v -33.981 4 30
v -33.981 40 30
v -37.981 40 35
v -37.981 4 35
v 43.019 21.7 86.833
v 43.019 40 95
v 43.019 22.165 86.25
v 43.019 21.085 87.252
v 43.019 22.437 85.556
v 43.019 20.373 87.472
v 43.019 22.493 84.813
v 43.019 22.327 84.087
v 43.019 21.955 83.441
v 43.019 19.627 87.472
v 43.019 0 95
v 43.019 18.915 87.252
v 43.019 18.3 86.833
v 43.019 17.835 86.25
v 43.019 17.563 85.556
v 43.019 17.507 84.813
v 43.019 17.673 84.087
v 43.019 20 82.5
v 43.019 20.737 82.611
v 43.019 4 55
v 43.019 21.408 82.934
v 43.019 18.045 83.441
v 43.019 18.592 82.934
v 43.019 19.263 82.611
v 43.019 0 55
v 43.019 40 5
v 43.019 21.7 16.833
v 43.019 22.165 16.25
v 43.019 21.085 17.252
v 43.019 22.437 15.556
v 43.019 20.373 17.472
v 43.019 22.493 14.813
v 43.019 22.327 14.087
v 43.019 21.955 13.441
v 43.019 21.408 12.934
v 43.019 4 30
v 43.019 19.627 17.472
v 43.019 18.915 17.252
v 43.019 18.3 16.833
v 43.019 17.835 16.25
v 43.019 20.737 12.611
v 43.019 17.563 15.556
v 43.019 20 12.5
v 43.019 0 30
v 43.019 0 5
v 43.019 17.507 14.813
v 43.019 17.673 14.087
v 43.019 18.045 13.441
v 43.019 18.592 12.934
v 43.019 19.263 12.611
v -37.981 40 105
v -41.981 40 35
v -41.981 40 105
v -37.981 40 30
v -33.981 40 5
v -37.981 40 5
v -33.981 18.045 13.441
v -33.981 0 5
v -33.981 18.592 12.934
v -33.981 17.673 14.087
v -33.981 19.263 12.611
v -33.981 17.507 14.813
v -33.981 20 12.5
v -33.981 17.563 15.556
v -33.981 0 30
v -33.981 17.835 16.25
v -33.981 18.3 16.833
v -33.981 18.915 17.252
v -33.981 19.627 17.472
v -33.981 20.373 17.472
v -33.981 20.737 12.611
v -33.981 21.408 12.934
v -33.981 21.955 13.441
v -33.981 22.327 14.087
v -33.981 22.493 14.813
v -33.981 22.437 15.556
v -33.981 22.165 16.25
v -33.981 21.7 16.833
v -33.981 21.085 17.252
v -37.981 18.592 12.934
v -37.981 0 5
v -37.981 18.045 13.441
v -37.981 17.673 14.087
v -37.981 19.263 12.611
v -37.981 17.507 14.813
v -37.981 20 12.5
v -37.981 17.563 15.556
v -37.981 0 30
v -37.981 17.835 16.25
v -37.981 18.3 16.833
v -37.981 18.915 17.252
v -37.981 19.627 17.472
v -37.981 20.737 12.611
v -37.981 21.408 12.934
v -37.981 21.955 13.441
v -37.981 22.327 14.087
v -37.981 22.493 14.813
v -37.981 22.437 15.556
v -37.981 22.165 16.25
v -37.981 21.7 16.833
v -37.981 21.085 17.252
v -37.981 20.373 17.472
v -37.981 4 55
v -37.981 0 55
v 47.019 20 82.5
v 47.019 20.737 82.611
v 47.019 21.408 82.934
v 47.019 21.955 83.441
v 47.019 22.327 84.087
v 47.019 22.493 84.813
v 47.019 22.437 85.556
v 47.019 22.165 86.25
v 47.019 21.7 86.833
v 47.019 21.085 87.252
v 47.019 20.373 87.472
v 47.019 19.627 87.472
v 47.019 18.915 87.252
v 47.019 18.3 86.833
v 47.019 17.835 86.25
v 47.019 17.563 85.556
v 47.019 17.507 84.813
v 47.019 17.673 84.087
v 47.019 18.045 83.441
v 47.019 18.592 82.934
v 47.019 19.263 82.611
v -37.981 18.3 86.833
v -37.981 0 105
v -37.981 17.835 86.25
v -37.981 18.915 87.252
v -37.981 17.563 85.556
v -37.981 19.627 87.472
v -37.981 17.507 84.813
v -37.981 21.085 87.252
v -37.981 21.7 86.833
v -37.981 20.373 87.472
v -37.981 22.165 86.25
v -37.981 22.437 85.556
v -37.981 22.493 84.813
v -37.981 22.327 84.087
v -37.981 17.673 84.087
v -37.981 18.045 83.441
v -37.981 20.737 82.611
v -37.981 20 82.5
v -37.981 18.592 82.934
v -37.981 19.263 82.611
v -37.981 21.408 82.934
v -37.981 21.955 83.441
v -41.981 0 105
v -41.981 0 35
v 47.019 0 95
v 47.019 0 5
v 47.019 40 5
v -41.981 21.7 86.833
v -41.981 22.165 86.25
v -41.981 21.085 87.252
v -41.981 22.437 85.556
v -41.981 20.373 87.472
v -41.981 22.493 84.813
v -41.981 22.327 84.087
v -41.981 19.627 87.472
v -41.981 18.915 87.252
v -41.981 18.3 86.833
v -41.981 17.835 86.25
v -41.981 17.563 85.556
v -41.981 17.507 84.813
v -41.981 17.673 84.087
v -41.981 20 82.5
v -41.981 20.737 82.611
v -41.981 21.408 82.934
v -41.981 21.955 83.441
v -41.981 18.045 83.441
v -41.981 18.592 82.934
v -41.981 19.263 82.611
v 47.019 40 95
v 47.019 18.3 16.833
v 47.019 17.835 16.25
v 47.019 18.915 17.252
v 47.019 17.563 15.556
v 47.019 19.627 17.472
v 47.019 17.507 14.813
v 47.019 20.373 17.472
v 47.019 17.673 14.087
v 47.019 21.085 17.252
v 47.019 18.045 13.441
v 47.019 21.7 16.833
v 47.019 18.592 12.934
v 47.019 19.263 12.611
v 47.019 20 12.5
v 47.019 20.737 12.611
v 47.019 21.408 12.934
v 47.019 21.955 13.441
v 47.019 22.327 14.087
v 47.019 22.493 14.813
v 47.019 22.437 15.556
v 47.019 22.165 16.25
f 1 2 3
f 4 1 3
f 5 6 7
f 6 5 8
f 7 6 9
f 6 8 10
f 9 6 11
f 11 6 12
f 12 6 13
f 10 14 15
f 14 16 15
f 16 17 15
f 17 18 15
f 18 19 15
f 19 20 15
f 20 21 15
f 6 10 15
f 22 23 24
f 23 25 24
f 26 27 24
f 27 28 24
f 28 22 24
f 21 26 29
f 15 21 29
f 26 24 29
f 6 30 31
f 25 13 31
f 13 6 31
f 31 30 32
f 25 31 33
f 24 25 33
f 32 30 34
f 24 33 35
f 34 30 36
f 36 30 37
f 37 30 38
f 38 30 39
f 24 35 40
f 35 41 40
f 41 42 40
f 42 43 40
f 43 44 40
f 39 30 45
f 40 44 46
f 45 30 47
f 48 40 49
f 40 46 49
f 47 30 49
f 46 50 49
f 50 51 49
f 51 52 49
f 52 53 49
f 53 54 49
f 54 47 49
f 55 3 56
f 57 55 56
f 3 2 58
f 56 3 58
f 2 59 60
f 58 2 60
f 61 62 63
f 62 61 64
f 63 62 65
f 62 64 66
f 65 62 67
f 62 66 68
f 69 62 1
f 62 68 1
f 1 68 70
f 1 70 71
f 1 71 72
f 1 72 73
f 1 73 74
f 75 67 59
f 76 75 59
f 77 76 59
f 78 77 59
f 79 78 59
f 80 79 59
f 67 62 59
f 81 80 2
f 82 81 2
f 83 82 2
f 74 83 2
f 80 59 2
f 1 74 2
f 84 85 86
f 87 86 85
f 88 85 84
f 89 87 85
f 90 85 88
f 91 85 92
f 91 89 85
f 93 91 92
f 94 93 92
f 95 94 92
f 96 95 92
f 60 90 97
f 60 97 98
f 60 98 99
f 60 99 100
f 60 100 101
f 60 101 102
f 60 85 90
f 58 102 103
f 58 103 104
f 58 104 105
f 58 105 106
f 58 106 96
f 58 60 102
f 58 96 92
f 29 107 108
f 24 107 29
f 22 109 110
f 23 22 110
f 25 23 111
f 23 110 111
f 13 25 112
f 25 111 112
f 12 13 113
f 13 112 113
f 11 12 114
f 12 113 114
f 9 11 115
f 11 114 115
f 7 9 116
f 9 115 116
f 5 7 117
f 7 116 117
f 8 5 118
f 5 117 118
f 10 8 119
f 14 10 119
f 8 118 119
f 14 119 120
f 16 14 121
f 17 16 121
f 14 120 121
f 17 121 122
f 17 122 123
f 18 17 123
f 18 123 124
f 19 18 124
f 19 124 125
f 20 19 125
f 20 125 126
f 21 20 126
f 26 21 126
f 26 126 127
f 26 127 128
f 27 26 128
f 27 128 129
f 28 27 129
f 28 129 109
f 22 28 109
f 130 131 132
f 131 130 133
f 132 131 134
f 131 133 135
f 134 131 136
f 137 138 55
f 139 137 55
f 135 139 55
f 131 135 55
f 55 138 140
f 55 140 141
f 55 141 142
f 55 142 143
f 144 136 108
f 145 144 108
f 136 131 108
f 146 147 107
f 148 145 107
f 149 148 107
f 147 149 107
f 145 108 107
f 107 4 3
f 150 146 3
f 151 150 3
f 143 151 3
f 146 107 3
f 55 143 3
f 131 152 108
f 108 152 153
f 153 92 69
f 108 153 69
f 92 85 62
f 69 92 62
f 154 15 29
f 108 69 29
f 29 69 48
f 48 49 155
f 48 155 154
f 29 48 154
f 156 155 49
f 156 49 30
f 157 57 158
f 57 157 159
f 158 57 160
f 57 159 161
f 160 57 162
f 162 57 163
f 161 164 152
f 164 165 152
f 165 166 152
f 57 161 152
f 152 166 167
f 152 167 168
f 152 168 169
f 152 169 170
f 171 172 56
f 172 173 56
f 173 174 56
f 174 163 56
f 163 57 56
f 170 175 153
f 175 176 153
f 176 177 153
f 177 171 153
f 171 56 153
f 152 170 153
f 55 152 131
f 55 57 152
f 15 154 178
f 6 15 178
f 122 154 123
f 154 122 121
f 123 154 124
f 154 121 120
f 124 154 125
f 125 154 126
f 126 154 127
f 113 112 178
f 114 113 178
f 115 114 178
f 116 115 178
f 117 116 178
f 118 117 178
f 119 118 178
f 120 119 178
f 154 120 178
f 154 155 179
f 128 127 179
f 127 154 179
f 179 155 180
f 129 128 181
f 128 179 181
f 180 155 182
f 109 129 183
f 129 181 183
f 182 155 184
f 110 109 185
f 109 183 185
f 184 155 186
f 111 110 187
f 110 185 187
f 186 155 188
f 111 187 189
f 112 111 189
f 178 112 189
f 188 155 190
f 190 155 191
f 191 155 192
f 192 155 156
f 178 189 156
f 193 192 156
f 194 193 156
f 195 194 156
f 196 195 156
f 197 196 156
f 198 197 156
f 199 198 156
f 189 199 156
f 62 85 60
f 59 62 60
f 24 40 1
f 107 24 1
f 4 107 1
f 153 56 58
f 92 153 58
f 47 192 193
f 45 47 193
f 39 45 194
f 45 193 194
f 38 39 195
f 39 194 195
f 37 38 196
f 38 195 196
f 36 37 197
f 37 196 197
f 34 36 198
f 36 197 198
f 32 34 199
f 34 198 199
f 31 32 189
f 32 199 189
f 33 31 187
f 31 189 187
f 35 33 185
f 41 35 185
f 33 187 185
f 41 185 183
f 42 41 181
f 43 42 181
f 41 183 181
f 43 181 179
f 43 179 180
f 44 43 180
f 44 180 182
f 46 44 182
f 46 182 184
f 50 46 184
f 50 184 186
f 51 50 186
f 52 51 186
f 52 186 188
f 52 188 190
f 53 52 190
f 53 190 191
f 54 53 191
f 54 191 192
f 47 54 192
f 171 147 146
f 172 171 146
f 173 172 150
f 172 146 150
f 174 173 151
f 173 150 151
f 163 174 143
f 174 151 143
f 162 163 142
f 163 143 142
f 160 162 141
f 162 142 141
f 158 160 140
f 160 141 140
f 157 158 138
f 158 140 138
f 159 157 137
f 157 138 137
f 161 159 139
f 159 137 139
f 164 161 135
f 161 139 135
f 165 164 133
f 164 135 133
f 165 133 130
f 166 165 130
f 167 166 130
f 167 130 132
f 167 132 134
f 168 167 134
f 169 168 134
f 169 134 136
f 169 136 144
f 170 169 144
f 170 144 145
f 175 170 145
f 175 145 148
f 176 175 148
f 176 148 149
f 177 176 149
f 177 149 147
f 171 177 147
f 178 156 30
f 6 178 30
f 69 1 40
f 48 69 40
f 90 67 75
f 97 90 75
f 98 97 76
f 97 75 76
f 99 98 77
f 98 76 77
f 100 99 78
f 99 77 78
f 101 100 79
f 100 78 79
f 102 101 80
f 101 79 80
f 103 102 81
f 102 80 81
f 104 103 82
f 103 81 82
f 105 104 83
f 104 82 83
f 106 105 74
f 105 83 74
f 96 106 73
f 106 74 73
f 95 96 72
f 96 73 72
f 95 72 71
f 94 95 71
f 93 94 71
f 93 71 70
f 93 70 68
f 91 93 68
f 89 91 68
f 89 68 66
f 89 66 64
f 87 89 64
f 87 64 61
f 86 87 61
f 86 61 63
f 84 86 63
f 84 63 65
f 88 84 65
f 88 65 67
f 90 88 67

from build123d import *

# Parameters (mm, degrees)
SALIENTE_EXTRUIR1_DEPTH = 105
CROQUIS3_W              = 4
CROQUIS3_H              = 30
SALIENTE_EXTRUIR2_DEPTH = 30
CROQUIS4_W              = 77
CROQUIS4_H              = 30
CORTAR_EXTRUIR1_DEPTH   = 30
CROQUIS5_W              = 81
CROQUIS5_H              = 50
CORTAR_EXTRUIR2_DEPTH   = 30
CROQUIS6_W              = 4
CROQUIS6_H              = 30
CORTAR_EXTRUIR3_DEPTH   = 70
SALIENTE_EXTRUIR4_DEPTH = 40
CROQUIS7_W              = 30
CROQUIS7_H              = 6
SALIENTE_EXTRUIR5_DEPTH = 4
CROQUIS10_W             = 5
CROQUIS10_H             = 40
CORTAR_EXTRUIR5_DEPTH   = 4
CROQUIS11_W             = 10
CROQUIS11_H             = 40
CORTAR_EXTRUIR6_DEPTH   = 4
CROQUIS12_R             = 2.5
CORTAR_EXTRUIR7_DEPTH   = 90
CROQUIS13_W             = 5
CROQUIS13_H             = 40
CORTAR_EXTRUIR8_DEPTH   = 10


with BuildPart() as part:
    # Croquis2 → Saliente-Extruir1 (new body)
    with BuildSketch(Plane.XY):
        Polygon((47.018573694, 40), (43.018573694, 40), (43.018573694, 4), (-37.981426306, 4), (-37.981426306, 40), (-41.981426306, 40), (-41.981426306, 0), (47.018573694, 0), align=None)
    extrude(amount=SALIENTE_EXTRUIR1_DEPTH)

    # Croquis3 → Saliente-Extruir2 (add)
    with BuildSketch(Plane.XY):
        with Locations((-35.981426306, 25)):
            Rectangle(CROQUIS3_W, CROQUIS3_H)
    extrude(amount=SALIENTE_EXTRUIR2_DEPTH)

    # Croquis4 → Cortar-Extruir1 (cut)
    with BuildSketch(Plane(origin=(0, 4, 0), x_dir=(1, 0, 0), z_dir=(0, 1, 0))):
        with Locations((4.518573694, -15)):
            Rectangle(CROQUIS4_W, CROQUIS4_H)
    extrude(amount=-CORTAR_EXTRUIR1_DEPTH, mode=Mode.SUBTRACT)

    # Croquis5 → Cortar-Extruir2 (cut)
    with BuildSketch(Plane(origin=(0, 4, 0), x_dir=(1, 0, 0), z_dir=(0, 1, 0))):
        with Locations((2.518573694, -80)):
            Rectangle(CROQUIS5_W, CROQUIS5_H)
    extrude(amount=-CORTAR_EXTRUIR2_DEPTH, mode=Mode.SUBTRACT)

    # Croquis6 → Cortar-Extruir3 (cut)
    with BuildSketch(Plane(origin=(0, 40, 0), x_dir=(1, 0, 0), z_dir=(0, 1, 0))):
        with Locations((-39.981426306, -15)):
            Rectangle(CROQUIS6_W, CROQUIS6_H)
        Polygon((-41.981426306, -30), (-41.981426306, -35), (-37.981426306, -30), align=None)
    extrude(amount=-CORTAR_EXTRUIR3_DEPTH, mode=Mode.SUBTRACT)

    # Croquis8 → Saliente-Extruir4 (add)
    with BuildSketch(Plane(origin=(0, 40, 0), x_dir=(1, 0, 0), z_dir=(0, 1, 0))):
        Polygon((-37.981426306, -30), (-33.981426306, -30), (-37.981426306, -35), align=None)
    extrude(amount=-SALIENTE_EXTRUIR4_DEPTH)

    # Croquis7 → Saliente-Extruir5 (add)
    with BuildSketch(Plane.ZY.offset(37.981426306)):
        with Locations((15, 7)):
            Rectangle(CROQUIS7_W, CROQUIS7_H)
    extrude(amount=-SALIENTE_EXTRUIR5_DEPTH)

    # Croquis10 → Cortar-Extruir5 (cut)
    with BuildSketch(Plane(origin=(47.018573694, 0, 0), x_dir=(0, 0, -1), z_dir=(1, 0, 0))):
        with Locations((-2.5, 20)):
            Rectangle(CROQUIS10_W, CROQUIS10_H)
    extrude(amount=-CORTAR_EXTRUIR5_DEPTH, mode=Mode.SUBTRACT)

    # Croquis11 → Cortar-Extruir6 (cut)
    with BuildSketch(Plane(origin=(47.018573694, 0, 0), x_dir=(0, 0, -1), z_dir=(1, 0, 0))):
        with Locations((-100, 20)):
            Rectangle(CROQUIS11_W, CROQUIS11_H)
    extrude(amount=-CORTAR_EXTRUIR6_DEPTH, mode=Mode.SUBTRACT)

    # Croquis12 → Cortar-Extruir7 (cut, through all)
    with BuildSketch(Plane(origin=(47.018573694, 0, 0), x_dir=(0, 0, -1), z_dir=(1, 0, 0))):
        with Locations((-15, 20)):
            Circle(CROQUIS12_R)
        with Locations((-85, 20)):
            Circle(CROQUIS12_R)
    extrude(amount=-CORTAR_EXTRUIR7_DEPTH, mode=Mode.SUBTRACT)

    # Croquis13 → Cortar-Extruir8 (cut)
    with BuildSketch(Plane.ZY.offset(37.981426306)):
        with Locations((2.5, 20)):
            Rectangle(CROQUIS13_W, CROQUIS13_H)
    extrude(amount=-CORTAR_EXTRUIR8_DEPTH, mode=Mode.SUBTRACT)


solid = part.part
